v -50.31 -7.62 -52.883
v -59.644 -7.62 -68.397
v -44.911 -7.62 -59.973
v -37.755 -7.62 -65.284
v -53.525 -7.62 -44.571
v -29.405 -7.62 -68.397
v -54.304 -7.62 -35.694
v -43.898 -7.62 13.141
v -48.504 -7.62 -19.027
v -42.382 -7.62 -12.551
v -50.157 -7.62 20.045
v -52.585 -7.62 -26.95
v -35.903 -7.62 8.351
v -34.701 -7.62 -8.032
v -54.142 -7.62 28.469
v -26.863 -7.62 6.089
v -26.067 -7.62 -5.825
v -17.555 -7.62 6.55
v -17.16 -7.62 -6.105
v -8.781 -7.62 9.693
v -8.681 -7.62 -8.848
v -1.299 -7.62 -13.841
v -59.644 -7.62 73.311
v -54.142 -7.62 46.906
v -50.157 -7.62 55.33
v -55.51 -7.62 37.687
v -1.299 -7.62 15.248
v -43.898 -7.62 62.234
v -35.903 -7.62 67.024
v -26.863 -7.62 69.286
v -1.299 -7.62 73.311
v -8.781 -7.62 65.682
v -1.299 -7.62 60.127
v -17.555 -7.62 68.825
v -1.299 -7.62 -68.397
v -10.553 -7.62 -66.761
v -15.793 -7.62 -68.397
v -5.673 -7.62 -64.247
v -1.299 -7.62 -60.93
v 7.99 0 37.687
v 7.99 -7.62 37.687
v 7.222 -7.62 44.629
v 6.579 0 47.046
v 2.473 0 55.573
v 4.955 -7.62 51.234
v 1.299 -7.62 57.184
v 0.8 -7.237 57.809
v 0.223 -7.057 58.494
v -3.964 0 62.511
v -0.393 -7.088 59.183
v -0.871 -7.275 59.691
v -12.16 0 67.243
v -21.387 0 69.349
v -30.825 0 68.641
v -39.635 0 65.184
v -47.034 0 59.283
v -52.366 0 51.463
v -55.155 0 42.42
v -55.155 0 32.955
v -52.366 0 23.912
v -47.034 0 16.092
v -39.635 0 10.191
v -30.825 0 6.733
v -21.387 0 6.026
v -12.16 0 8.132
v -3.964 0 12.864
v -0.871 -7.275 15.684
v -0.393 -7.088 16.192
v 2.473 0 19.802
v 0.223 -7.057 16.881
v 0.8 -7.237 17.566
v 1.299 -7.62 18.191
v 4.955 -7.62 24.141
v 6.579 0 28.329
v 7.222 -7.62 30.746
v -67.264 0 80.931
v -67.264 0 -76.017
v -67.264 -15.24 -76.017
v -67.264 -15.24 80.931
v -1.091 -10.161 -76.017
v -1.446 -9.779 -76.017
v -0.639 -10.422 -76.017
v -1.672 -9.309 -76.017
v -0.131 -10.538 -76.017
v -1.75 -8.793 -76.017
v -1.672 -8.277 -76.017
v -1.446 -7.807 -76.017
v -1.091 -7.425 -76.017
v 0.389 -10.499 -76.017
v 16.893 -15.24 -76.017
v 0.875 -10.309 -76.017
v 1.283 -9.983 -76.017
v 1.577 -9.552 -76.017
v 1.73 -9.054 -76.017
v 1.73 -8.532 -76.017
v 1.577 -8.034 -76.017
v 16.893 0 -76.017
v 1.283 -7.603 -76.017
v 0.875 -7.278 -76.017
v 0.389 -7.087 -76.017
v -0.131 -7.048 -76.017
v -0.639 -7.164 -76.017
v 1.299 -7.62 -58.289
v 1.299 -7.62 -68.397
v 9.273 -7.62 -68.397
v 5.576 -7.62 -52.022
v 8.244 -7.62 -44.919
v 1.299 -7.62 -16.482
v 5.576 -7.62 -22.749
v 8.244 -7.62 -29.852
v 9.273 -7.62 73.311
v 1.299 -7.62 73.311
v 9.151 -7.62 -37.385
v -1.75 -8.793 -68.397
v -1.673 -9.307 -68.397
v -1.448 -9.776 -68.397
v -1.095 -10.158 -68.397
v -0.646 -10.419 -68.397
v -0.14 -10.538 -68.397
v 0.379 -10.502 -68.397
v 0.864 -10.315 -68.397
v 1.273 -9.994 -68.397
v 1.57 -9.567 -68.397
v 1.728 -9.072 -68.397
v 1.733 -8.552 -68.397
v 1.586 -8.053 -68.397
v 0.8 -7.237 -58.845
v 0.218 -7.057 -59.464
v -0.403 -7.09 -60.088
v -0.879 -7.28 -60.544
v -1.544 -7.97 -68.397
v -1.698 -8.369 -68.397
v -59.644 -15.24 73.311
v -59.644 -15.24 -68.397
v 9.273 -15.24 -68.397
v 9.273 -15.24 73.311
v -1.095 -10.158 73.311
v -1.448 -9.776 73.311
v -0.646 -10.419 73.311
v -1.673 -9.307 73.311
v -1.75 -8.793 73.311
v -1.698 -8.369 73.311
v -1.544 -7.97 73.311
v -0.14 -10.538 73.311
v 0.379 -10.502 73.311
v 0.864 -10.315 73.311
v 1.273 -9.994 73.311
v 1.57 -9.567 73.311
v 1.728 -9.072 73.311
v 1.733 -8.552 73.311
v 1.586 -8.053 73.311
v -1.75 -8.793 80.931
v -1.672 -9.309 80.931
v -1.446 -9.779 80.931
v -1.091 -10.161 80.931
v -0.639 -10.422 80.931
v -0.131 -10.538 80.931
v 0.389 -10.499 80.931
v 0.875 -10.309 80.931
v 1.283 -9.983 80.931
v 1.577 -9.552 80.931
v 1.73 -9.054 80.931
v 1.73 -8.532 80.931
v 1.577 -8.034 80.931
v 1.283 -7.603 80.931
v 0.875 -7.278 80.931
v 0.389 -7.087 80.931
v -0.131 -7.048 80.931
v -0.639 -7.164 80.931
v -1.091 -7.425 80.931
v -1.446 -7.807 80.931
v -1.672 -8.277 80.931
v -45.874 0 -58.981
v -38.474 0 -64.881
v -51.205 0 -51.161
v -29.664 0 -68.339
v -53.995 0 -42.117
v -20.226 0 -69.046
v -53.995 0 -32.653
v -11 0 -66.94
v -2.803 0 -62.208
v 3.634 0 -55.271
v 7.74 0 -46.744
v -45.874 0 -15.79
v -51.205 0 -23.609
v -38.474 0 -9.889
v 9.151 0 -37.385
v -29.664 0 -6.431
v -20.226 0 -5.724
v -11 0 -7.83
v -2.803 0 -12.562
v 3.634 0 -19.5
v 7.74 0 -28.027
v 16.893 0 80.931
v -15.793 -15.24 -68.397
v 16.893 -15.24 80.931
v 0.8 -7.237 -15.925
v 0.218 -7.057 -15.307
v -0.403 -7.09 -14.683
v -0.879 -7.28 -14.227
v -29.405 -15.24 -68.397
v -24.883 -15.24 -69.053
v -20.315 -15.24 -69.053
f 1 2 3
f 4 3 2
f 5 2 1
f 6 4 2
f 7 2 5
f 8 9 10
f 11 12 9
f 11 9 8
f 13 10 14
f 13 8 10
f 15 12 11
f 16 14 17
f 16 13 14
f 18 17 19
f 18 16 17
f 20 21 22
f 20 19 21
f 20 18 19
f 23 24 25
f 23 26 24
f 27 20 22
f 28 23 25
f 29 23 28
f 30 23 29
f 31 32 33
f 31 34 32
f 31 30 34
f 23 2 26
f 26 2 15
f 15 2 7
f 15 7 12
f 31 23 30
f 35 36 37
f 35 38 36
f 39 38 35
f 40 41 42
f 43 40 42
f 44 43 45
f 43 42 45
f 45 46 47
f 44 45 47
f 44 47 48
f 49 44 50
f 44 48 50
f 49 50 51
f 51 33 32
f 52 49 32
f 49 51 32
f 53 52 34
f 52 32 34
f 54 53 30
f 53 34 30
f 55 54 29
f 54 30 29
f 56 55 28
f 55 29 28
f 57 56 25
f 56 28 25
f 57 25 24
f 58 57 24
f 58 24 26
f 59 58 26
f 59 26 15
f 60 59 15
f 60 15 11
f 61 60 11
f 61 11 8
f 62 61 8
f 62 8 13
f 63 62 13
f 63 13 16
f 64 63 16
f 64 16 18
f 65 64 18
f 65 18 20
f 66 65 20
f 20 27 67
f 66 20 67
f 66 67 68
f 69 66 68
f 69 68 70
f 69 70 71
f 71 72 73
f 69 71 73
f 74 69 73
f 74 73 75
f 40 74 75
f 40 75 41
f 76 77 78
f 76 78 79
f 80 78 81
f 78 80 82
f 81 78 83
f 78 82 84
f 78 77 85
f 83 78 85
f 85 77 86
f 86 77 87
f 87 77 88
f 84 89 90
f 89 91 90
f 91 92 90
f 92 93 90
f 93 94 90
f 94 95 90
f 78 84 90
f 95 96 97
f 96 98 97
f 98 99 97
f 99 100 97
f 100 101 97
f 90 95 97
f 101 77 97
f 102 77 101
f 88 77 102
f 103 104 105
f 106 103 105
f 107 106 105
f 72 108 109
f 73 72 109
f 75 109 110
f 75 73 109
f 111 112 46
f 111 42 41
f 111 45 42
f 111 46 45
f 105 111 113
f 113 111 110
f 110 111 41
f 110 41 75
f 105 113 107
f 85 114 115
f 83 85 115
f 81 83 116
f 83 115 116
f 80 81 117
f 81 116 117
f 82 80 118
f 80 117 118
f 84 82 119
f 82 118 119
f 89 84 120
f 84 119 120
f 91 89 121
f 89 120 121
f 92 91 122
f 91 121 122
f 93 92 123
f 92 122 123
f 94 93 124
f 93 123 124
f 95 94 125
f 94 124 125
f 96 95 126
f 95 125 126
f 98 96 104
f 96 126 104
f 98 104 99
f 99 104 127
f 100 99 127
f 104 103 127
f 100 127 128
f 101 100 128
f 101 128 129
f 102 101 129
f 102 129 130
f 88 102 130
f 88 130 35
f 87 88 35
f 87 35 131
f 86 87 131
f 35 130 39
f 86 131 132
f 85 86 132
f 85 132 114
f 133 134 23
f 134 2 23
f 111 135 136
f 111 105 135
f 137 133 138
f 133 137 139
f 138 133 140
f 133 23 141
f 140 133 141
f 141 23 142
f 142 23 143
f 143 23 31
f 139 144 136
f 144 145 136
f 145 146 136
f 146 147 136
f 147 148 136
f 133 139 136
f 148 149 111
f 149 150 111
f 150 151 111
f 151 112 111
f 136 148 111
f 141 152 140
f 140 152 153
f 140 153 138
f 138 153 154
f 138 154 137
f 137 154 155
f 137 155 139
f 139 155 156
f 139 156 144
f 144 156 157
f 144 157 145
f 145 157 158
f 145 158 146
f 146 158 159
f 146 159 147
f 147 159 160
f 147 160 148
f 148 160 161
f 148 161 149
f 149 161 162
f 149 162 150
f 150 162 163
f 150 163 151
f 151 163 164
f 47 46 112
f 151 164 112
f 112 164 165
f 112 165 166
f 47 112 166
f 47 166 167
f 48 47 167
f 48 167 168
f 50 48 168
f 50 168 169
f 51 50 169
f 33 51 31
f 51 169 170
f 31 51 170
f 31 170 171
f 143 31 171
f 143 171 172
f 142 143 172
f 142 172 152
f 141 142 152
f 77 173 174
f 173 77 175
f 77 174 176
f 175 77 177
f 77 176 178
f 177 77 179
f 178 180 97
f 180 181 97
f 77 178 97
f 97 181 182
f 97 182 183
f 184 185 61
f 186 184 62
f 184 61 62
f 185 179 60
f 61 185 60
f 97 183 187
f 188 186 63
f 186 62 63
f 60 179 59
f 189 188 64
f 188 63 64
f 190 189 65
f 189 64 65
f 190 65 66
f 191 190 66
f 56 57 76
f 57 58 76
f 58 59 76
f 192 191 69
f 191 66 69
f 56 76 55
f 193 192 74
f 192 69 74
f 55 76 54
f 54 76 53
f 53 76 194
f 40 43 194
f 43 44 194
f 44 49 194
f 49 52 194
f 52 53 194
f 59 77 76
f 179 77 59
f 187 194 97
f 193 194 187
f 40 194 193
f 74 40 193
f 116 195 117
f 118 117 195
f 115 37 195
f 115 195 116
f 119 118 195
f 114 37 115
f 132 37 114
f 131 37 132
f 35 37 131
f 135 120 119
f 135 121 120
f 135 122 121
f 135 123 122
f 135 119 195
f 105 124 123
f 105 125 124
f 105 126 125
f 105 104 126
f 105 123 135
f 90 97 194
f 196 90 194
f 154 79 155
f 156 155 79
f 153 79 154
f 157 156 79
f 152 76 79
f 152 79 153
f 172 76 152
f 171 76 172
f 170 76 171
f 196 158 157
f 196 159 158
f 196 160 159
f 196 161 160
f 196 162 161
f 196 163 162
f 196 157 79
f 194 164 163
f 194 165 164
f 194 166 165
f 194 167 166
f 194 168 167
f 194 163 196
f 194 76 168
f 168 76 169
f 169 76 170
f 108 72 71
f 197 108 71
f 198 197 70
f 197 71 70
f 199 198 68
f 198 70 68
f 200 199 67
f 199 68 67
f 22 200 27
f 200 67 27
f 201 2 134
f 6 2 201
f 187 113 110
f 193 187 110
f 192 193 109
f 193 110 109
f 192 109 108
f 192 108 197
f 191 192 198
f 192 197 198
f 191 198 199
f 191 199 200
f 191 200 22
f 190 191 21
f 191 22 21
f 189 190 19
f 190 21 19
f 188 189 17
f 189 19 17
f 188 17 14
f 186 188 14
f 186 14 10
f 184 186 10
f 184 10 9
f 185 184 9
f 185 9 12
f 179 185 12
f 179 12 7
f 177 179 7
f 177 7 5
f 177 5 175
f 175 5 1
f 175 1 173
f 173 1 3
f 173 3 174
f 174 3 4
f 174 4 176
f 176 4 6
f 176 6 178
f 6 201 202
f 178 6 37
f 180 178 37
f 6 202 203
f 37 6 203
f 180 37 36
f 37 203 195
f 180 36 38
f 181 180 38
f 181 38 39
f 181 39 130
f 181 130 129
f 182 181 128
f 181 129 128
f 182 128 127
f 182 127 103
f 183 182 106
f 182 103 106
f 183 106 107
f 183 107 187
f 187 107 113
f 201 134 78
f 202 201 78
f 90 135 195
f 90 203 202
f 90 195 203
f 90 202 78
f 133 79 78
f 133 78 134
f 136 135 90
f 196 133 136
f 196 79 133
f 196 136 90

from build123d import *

# Parameters (mm, degrees)
F0_W     = 84.156403
F0_H     = 156.948597
F1_DEPTH = 15.24
F2_T     = -7.62
F4_D     = 63.5
F6_D     = 63.5
F8_D     = 3.5


with BuildPart() as f1:
    # F0 (on Front) → F1 (new body)
    with BuildSketch(Plane.XZ):
        with Locations((-25.185494, 2.457119)):
            Rectangle(F0_W, F0_H)
    extrude(amount=F1_DEPTH)

    # F2
    f2_openings = [f1.faces().sort_by_distance(p)[0] for p in [
        (-25.185495, -15.24, 2.45712),
    ]]
    offset(amount=F2_T, openings=f2_openings)

    # F4 (through all)
    with Locations(Plane(origin=(0, 0, 0), x_dir=(-1, 0, 0), z_dir=(0, 1, 0))):
        with Locations((23.760062, 37.687458)):
            Hole(F4_D / 2)

    # F6 (through all)
    with Locations(Plane(origin=(0, 0, 0), x_dir=(-1, 0, 0), z_dir=(0, 1, 0))):
        with Locations((22.599144, -37.385169)):
            Hole(F6_D / 2)

    # F8 (through all)
    with Locations(Plane(origin=(0, 0, -76.017179), x_dir=(1, 0, 0), z_dir=(0, 0, -1))):
        with Locations((0, 8.793092)):
            Hole(F8_D / 2)


solid = f1.part
